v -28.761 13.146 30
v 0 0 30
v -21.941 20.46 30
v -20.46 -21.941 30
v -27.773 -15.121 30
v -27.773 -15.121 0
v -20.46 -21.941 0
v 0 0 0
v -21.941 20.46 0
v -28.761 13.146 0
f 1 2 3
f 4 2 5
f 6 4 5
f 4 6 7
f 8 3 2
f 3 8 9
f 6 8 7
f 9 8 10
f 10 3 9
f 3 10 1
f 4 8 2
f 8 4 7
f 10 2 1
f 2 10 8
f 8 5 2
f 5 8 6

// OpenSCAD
rotate([0,0,92])
rotate([0,-90,0]){
    difference(){
        rotate([-45,0,0]) {
            cube([30, 30, 30]);
        }
        scale([1,2,1]) {
            rotate([-45,0,0]) {
                cube([30, 30, 30]);
            }
        }
    }
}
